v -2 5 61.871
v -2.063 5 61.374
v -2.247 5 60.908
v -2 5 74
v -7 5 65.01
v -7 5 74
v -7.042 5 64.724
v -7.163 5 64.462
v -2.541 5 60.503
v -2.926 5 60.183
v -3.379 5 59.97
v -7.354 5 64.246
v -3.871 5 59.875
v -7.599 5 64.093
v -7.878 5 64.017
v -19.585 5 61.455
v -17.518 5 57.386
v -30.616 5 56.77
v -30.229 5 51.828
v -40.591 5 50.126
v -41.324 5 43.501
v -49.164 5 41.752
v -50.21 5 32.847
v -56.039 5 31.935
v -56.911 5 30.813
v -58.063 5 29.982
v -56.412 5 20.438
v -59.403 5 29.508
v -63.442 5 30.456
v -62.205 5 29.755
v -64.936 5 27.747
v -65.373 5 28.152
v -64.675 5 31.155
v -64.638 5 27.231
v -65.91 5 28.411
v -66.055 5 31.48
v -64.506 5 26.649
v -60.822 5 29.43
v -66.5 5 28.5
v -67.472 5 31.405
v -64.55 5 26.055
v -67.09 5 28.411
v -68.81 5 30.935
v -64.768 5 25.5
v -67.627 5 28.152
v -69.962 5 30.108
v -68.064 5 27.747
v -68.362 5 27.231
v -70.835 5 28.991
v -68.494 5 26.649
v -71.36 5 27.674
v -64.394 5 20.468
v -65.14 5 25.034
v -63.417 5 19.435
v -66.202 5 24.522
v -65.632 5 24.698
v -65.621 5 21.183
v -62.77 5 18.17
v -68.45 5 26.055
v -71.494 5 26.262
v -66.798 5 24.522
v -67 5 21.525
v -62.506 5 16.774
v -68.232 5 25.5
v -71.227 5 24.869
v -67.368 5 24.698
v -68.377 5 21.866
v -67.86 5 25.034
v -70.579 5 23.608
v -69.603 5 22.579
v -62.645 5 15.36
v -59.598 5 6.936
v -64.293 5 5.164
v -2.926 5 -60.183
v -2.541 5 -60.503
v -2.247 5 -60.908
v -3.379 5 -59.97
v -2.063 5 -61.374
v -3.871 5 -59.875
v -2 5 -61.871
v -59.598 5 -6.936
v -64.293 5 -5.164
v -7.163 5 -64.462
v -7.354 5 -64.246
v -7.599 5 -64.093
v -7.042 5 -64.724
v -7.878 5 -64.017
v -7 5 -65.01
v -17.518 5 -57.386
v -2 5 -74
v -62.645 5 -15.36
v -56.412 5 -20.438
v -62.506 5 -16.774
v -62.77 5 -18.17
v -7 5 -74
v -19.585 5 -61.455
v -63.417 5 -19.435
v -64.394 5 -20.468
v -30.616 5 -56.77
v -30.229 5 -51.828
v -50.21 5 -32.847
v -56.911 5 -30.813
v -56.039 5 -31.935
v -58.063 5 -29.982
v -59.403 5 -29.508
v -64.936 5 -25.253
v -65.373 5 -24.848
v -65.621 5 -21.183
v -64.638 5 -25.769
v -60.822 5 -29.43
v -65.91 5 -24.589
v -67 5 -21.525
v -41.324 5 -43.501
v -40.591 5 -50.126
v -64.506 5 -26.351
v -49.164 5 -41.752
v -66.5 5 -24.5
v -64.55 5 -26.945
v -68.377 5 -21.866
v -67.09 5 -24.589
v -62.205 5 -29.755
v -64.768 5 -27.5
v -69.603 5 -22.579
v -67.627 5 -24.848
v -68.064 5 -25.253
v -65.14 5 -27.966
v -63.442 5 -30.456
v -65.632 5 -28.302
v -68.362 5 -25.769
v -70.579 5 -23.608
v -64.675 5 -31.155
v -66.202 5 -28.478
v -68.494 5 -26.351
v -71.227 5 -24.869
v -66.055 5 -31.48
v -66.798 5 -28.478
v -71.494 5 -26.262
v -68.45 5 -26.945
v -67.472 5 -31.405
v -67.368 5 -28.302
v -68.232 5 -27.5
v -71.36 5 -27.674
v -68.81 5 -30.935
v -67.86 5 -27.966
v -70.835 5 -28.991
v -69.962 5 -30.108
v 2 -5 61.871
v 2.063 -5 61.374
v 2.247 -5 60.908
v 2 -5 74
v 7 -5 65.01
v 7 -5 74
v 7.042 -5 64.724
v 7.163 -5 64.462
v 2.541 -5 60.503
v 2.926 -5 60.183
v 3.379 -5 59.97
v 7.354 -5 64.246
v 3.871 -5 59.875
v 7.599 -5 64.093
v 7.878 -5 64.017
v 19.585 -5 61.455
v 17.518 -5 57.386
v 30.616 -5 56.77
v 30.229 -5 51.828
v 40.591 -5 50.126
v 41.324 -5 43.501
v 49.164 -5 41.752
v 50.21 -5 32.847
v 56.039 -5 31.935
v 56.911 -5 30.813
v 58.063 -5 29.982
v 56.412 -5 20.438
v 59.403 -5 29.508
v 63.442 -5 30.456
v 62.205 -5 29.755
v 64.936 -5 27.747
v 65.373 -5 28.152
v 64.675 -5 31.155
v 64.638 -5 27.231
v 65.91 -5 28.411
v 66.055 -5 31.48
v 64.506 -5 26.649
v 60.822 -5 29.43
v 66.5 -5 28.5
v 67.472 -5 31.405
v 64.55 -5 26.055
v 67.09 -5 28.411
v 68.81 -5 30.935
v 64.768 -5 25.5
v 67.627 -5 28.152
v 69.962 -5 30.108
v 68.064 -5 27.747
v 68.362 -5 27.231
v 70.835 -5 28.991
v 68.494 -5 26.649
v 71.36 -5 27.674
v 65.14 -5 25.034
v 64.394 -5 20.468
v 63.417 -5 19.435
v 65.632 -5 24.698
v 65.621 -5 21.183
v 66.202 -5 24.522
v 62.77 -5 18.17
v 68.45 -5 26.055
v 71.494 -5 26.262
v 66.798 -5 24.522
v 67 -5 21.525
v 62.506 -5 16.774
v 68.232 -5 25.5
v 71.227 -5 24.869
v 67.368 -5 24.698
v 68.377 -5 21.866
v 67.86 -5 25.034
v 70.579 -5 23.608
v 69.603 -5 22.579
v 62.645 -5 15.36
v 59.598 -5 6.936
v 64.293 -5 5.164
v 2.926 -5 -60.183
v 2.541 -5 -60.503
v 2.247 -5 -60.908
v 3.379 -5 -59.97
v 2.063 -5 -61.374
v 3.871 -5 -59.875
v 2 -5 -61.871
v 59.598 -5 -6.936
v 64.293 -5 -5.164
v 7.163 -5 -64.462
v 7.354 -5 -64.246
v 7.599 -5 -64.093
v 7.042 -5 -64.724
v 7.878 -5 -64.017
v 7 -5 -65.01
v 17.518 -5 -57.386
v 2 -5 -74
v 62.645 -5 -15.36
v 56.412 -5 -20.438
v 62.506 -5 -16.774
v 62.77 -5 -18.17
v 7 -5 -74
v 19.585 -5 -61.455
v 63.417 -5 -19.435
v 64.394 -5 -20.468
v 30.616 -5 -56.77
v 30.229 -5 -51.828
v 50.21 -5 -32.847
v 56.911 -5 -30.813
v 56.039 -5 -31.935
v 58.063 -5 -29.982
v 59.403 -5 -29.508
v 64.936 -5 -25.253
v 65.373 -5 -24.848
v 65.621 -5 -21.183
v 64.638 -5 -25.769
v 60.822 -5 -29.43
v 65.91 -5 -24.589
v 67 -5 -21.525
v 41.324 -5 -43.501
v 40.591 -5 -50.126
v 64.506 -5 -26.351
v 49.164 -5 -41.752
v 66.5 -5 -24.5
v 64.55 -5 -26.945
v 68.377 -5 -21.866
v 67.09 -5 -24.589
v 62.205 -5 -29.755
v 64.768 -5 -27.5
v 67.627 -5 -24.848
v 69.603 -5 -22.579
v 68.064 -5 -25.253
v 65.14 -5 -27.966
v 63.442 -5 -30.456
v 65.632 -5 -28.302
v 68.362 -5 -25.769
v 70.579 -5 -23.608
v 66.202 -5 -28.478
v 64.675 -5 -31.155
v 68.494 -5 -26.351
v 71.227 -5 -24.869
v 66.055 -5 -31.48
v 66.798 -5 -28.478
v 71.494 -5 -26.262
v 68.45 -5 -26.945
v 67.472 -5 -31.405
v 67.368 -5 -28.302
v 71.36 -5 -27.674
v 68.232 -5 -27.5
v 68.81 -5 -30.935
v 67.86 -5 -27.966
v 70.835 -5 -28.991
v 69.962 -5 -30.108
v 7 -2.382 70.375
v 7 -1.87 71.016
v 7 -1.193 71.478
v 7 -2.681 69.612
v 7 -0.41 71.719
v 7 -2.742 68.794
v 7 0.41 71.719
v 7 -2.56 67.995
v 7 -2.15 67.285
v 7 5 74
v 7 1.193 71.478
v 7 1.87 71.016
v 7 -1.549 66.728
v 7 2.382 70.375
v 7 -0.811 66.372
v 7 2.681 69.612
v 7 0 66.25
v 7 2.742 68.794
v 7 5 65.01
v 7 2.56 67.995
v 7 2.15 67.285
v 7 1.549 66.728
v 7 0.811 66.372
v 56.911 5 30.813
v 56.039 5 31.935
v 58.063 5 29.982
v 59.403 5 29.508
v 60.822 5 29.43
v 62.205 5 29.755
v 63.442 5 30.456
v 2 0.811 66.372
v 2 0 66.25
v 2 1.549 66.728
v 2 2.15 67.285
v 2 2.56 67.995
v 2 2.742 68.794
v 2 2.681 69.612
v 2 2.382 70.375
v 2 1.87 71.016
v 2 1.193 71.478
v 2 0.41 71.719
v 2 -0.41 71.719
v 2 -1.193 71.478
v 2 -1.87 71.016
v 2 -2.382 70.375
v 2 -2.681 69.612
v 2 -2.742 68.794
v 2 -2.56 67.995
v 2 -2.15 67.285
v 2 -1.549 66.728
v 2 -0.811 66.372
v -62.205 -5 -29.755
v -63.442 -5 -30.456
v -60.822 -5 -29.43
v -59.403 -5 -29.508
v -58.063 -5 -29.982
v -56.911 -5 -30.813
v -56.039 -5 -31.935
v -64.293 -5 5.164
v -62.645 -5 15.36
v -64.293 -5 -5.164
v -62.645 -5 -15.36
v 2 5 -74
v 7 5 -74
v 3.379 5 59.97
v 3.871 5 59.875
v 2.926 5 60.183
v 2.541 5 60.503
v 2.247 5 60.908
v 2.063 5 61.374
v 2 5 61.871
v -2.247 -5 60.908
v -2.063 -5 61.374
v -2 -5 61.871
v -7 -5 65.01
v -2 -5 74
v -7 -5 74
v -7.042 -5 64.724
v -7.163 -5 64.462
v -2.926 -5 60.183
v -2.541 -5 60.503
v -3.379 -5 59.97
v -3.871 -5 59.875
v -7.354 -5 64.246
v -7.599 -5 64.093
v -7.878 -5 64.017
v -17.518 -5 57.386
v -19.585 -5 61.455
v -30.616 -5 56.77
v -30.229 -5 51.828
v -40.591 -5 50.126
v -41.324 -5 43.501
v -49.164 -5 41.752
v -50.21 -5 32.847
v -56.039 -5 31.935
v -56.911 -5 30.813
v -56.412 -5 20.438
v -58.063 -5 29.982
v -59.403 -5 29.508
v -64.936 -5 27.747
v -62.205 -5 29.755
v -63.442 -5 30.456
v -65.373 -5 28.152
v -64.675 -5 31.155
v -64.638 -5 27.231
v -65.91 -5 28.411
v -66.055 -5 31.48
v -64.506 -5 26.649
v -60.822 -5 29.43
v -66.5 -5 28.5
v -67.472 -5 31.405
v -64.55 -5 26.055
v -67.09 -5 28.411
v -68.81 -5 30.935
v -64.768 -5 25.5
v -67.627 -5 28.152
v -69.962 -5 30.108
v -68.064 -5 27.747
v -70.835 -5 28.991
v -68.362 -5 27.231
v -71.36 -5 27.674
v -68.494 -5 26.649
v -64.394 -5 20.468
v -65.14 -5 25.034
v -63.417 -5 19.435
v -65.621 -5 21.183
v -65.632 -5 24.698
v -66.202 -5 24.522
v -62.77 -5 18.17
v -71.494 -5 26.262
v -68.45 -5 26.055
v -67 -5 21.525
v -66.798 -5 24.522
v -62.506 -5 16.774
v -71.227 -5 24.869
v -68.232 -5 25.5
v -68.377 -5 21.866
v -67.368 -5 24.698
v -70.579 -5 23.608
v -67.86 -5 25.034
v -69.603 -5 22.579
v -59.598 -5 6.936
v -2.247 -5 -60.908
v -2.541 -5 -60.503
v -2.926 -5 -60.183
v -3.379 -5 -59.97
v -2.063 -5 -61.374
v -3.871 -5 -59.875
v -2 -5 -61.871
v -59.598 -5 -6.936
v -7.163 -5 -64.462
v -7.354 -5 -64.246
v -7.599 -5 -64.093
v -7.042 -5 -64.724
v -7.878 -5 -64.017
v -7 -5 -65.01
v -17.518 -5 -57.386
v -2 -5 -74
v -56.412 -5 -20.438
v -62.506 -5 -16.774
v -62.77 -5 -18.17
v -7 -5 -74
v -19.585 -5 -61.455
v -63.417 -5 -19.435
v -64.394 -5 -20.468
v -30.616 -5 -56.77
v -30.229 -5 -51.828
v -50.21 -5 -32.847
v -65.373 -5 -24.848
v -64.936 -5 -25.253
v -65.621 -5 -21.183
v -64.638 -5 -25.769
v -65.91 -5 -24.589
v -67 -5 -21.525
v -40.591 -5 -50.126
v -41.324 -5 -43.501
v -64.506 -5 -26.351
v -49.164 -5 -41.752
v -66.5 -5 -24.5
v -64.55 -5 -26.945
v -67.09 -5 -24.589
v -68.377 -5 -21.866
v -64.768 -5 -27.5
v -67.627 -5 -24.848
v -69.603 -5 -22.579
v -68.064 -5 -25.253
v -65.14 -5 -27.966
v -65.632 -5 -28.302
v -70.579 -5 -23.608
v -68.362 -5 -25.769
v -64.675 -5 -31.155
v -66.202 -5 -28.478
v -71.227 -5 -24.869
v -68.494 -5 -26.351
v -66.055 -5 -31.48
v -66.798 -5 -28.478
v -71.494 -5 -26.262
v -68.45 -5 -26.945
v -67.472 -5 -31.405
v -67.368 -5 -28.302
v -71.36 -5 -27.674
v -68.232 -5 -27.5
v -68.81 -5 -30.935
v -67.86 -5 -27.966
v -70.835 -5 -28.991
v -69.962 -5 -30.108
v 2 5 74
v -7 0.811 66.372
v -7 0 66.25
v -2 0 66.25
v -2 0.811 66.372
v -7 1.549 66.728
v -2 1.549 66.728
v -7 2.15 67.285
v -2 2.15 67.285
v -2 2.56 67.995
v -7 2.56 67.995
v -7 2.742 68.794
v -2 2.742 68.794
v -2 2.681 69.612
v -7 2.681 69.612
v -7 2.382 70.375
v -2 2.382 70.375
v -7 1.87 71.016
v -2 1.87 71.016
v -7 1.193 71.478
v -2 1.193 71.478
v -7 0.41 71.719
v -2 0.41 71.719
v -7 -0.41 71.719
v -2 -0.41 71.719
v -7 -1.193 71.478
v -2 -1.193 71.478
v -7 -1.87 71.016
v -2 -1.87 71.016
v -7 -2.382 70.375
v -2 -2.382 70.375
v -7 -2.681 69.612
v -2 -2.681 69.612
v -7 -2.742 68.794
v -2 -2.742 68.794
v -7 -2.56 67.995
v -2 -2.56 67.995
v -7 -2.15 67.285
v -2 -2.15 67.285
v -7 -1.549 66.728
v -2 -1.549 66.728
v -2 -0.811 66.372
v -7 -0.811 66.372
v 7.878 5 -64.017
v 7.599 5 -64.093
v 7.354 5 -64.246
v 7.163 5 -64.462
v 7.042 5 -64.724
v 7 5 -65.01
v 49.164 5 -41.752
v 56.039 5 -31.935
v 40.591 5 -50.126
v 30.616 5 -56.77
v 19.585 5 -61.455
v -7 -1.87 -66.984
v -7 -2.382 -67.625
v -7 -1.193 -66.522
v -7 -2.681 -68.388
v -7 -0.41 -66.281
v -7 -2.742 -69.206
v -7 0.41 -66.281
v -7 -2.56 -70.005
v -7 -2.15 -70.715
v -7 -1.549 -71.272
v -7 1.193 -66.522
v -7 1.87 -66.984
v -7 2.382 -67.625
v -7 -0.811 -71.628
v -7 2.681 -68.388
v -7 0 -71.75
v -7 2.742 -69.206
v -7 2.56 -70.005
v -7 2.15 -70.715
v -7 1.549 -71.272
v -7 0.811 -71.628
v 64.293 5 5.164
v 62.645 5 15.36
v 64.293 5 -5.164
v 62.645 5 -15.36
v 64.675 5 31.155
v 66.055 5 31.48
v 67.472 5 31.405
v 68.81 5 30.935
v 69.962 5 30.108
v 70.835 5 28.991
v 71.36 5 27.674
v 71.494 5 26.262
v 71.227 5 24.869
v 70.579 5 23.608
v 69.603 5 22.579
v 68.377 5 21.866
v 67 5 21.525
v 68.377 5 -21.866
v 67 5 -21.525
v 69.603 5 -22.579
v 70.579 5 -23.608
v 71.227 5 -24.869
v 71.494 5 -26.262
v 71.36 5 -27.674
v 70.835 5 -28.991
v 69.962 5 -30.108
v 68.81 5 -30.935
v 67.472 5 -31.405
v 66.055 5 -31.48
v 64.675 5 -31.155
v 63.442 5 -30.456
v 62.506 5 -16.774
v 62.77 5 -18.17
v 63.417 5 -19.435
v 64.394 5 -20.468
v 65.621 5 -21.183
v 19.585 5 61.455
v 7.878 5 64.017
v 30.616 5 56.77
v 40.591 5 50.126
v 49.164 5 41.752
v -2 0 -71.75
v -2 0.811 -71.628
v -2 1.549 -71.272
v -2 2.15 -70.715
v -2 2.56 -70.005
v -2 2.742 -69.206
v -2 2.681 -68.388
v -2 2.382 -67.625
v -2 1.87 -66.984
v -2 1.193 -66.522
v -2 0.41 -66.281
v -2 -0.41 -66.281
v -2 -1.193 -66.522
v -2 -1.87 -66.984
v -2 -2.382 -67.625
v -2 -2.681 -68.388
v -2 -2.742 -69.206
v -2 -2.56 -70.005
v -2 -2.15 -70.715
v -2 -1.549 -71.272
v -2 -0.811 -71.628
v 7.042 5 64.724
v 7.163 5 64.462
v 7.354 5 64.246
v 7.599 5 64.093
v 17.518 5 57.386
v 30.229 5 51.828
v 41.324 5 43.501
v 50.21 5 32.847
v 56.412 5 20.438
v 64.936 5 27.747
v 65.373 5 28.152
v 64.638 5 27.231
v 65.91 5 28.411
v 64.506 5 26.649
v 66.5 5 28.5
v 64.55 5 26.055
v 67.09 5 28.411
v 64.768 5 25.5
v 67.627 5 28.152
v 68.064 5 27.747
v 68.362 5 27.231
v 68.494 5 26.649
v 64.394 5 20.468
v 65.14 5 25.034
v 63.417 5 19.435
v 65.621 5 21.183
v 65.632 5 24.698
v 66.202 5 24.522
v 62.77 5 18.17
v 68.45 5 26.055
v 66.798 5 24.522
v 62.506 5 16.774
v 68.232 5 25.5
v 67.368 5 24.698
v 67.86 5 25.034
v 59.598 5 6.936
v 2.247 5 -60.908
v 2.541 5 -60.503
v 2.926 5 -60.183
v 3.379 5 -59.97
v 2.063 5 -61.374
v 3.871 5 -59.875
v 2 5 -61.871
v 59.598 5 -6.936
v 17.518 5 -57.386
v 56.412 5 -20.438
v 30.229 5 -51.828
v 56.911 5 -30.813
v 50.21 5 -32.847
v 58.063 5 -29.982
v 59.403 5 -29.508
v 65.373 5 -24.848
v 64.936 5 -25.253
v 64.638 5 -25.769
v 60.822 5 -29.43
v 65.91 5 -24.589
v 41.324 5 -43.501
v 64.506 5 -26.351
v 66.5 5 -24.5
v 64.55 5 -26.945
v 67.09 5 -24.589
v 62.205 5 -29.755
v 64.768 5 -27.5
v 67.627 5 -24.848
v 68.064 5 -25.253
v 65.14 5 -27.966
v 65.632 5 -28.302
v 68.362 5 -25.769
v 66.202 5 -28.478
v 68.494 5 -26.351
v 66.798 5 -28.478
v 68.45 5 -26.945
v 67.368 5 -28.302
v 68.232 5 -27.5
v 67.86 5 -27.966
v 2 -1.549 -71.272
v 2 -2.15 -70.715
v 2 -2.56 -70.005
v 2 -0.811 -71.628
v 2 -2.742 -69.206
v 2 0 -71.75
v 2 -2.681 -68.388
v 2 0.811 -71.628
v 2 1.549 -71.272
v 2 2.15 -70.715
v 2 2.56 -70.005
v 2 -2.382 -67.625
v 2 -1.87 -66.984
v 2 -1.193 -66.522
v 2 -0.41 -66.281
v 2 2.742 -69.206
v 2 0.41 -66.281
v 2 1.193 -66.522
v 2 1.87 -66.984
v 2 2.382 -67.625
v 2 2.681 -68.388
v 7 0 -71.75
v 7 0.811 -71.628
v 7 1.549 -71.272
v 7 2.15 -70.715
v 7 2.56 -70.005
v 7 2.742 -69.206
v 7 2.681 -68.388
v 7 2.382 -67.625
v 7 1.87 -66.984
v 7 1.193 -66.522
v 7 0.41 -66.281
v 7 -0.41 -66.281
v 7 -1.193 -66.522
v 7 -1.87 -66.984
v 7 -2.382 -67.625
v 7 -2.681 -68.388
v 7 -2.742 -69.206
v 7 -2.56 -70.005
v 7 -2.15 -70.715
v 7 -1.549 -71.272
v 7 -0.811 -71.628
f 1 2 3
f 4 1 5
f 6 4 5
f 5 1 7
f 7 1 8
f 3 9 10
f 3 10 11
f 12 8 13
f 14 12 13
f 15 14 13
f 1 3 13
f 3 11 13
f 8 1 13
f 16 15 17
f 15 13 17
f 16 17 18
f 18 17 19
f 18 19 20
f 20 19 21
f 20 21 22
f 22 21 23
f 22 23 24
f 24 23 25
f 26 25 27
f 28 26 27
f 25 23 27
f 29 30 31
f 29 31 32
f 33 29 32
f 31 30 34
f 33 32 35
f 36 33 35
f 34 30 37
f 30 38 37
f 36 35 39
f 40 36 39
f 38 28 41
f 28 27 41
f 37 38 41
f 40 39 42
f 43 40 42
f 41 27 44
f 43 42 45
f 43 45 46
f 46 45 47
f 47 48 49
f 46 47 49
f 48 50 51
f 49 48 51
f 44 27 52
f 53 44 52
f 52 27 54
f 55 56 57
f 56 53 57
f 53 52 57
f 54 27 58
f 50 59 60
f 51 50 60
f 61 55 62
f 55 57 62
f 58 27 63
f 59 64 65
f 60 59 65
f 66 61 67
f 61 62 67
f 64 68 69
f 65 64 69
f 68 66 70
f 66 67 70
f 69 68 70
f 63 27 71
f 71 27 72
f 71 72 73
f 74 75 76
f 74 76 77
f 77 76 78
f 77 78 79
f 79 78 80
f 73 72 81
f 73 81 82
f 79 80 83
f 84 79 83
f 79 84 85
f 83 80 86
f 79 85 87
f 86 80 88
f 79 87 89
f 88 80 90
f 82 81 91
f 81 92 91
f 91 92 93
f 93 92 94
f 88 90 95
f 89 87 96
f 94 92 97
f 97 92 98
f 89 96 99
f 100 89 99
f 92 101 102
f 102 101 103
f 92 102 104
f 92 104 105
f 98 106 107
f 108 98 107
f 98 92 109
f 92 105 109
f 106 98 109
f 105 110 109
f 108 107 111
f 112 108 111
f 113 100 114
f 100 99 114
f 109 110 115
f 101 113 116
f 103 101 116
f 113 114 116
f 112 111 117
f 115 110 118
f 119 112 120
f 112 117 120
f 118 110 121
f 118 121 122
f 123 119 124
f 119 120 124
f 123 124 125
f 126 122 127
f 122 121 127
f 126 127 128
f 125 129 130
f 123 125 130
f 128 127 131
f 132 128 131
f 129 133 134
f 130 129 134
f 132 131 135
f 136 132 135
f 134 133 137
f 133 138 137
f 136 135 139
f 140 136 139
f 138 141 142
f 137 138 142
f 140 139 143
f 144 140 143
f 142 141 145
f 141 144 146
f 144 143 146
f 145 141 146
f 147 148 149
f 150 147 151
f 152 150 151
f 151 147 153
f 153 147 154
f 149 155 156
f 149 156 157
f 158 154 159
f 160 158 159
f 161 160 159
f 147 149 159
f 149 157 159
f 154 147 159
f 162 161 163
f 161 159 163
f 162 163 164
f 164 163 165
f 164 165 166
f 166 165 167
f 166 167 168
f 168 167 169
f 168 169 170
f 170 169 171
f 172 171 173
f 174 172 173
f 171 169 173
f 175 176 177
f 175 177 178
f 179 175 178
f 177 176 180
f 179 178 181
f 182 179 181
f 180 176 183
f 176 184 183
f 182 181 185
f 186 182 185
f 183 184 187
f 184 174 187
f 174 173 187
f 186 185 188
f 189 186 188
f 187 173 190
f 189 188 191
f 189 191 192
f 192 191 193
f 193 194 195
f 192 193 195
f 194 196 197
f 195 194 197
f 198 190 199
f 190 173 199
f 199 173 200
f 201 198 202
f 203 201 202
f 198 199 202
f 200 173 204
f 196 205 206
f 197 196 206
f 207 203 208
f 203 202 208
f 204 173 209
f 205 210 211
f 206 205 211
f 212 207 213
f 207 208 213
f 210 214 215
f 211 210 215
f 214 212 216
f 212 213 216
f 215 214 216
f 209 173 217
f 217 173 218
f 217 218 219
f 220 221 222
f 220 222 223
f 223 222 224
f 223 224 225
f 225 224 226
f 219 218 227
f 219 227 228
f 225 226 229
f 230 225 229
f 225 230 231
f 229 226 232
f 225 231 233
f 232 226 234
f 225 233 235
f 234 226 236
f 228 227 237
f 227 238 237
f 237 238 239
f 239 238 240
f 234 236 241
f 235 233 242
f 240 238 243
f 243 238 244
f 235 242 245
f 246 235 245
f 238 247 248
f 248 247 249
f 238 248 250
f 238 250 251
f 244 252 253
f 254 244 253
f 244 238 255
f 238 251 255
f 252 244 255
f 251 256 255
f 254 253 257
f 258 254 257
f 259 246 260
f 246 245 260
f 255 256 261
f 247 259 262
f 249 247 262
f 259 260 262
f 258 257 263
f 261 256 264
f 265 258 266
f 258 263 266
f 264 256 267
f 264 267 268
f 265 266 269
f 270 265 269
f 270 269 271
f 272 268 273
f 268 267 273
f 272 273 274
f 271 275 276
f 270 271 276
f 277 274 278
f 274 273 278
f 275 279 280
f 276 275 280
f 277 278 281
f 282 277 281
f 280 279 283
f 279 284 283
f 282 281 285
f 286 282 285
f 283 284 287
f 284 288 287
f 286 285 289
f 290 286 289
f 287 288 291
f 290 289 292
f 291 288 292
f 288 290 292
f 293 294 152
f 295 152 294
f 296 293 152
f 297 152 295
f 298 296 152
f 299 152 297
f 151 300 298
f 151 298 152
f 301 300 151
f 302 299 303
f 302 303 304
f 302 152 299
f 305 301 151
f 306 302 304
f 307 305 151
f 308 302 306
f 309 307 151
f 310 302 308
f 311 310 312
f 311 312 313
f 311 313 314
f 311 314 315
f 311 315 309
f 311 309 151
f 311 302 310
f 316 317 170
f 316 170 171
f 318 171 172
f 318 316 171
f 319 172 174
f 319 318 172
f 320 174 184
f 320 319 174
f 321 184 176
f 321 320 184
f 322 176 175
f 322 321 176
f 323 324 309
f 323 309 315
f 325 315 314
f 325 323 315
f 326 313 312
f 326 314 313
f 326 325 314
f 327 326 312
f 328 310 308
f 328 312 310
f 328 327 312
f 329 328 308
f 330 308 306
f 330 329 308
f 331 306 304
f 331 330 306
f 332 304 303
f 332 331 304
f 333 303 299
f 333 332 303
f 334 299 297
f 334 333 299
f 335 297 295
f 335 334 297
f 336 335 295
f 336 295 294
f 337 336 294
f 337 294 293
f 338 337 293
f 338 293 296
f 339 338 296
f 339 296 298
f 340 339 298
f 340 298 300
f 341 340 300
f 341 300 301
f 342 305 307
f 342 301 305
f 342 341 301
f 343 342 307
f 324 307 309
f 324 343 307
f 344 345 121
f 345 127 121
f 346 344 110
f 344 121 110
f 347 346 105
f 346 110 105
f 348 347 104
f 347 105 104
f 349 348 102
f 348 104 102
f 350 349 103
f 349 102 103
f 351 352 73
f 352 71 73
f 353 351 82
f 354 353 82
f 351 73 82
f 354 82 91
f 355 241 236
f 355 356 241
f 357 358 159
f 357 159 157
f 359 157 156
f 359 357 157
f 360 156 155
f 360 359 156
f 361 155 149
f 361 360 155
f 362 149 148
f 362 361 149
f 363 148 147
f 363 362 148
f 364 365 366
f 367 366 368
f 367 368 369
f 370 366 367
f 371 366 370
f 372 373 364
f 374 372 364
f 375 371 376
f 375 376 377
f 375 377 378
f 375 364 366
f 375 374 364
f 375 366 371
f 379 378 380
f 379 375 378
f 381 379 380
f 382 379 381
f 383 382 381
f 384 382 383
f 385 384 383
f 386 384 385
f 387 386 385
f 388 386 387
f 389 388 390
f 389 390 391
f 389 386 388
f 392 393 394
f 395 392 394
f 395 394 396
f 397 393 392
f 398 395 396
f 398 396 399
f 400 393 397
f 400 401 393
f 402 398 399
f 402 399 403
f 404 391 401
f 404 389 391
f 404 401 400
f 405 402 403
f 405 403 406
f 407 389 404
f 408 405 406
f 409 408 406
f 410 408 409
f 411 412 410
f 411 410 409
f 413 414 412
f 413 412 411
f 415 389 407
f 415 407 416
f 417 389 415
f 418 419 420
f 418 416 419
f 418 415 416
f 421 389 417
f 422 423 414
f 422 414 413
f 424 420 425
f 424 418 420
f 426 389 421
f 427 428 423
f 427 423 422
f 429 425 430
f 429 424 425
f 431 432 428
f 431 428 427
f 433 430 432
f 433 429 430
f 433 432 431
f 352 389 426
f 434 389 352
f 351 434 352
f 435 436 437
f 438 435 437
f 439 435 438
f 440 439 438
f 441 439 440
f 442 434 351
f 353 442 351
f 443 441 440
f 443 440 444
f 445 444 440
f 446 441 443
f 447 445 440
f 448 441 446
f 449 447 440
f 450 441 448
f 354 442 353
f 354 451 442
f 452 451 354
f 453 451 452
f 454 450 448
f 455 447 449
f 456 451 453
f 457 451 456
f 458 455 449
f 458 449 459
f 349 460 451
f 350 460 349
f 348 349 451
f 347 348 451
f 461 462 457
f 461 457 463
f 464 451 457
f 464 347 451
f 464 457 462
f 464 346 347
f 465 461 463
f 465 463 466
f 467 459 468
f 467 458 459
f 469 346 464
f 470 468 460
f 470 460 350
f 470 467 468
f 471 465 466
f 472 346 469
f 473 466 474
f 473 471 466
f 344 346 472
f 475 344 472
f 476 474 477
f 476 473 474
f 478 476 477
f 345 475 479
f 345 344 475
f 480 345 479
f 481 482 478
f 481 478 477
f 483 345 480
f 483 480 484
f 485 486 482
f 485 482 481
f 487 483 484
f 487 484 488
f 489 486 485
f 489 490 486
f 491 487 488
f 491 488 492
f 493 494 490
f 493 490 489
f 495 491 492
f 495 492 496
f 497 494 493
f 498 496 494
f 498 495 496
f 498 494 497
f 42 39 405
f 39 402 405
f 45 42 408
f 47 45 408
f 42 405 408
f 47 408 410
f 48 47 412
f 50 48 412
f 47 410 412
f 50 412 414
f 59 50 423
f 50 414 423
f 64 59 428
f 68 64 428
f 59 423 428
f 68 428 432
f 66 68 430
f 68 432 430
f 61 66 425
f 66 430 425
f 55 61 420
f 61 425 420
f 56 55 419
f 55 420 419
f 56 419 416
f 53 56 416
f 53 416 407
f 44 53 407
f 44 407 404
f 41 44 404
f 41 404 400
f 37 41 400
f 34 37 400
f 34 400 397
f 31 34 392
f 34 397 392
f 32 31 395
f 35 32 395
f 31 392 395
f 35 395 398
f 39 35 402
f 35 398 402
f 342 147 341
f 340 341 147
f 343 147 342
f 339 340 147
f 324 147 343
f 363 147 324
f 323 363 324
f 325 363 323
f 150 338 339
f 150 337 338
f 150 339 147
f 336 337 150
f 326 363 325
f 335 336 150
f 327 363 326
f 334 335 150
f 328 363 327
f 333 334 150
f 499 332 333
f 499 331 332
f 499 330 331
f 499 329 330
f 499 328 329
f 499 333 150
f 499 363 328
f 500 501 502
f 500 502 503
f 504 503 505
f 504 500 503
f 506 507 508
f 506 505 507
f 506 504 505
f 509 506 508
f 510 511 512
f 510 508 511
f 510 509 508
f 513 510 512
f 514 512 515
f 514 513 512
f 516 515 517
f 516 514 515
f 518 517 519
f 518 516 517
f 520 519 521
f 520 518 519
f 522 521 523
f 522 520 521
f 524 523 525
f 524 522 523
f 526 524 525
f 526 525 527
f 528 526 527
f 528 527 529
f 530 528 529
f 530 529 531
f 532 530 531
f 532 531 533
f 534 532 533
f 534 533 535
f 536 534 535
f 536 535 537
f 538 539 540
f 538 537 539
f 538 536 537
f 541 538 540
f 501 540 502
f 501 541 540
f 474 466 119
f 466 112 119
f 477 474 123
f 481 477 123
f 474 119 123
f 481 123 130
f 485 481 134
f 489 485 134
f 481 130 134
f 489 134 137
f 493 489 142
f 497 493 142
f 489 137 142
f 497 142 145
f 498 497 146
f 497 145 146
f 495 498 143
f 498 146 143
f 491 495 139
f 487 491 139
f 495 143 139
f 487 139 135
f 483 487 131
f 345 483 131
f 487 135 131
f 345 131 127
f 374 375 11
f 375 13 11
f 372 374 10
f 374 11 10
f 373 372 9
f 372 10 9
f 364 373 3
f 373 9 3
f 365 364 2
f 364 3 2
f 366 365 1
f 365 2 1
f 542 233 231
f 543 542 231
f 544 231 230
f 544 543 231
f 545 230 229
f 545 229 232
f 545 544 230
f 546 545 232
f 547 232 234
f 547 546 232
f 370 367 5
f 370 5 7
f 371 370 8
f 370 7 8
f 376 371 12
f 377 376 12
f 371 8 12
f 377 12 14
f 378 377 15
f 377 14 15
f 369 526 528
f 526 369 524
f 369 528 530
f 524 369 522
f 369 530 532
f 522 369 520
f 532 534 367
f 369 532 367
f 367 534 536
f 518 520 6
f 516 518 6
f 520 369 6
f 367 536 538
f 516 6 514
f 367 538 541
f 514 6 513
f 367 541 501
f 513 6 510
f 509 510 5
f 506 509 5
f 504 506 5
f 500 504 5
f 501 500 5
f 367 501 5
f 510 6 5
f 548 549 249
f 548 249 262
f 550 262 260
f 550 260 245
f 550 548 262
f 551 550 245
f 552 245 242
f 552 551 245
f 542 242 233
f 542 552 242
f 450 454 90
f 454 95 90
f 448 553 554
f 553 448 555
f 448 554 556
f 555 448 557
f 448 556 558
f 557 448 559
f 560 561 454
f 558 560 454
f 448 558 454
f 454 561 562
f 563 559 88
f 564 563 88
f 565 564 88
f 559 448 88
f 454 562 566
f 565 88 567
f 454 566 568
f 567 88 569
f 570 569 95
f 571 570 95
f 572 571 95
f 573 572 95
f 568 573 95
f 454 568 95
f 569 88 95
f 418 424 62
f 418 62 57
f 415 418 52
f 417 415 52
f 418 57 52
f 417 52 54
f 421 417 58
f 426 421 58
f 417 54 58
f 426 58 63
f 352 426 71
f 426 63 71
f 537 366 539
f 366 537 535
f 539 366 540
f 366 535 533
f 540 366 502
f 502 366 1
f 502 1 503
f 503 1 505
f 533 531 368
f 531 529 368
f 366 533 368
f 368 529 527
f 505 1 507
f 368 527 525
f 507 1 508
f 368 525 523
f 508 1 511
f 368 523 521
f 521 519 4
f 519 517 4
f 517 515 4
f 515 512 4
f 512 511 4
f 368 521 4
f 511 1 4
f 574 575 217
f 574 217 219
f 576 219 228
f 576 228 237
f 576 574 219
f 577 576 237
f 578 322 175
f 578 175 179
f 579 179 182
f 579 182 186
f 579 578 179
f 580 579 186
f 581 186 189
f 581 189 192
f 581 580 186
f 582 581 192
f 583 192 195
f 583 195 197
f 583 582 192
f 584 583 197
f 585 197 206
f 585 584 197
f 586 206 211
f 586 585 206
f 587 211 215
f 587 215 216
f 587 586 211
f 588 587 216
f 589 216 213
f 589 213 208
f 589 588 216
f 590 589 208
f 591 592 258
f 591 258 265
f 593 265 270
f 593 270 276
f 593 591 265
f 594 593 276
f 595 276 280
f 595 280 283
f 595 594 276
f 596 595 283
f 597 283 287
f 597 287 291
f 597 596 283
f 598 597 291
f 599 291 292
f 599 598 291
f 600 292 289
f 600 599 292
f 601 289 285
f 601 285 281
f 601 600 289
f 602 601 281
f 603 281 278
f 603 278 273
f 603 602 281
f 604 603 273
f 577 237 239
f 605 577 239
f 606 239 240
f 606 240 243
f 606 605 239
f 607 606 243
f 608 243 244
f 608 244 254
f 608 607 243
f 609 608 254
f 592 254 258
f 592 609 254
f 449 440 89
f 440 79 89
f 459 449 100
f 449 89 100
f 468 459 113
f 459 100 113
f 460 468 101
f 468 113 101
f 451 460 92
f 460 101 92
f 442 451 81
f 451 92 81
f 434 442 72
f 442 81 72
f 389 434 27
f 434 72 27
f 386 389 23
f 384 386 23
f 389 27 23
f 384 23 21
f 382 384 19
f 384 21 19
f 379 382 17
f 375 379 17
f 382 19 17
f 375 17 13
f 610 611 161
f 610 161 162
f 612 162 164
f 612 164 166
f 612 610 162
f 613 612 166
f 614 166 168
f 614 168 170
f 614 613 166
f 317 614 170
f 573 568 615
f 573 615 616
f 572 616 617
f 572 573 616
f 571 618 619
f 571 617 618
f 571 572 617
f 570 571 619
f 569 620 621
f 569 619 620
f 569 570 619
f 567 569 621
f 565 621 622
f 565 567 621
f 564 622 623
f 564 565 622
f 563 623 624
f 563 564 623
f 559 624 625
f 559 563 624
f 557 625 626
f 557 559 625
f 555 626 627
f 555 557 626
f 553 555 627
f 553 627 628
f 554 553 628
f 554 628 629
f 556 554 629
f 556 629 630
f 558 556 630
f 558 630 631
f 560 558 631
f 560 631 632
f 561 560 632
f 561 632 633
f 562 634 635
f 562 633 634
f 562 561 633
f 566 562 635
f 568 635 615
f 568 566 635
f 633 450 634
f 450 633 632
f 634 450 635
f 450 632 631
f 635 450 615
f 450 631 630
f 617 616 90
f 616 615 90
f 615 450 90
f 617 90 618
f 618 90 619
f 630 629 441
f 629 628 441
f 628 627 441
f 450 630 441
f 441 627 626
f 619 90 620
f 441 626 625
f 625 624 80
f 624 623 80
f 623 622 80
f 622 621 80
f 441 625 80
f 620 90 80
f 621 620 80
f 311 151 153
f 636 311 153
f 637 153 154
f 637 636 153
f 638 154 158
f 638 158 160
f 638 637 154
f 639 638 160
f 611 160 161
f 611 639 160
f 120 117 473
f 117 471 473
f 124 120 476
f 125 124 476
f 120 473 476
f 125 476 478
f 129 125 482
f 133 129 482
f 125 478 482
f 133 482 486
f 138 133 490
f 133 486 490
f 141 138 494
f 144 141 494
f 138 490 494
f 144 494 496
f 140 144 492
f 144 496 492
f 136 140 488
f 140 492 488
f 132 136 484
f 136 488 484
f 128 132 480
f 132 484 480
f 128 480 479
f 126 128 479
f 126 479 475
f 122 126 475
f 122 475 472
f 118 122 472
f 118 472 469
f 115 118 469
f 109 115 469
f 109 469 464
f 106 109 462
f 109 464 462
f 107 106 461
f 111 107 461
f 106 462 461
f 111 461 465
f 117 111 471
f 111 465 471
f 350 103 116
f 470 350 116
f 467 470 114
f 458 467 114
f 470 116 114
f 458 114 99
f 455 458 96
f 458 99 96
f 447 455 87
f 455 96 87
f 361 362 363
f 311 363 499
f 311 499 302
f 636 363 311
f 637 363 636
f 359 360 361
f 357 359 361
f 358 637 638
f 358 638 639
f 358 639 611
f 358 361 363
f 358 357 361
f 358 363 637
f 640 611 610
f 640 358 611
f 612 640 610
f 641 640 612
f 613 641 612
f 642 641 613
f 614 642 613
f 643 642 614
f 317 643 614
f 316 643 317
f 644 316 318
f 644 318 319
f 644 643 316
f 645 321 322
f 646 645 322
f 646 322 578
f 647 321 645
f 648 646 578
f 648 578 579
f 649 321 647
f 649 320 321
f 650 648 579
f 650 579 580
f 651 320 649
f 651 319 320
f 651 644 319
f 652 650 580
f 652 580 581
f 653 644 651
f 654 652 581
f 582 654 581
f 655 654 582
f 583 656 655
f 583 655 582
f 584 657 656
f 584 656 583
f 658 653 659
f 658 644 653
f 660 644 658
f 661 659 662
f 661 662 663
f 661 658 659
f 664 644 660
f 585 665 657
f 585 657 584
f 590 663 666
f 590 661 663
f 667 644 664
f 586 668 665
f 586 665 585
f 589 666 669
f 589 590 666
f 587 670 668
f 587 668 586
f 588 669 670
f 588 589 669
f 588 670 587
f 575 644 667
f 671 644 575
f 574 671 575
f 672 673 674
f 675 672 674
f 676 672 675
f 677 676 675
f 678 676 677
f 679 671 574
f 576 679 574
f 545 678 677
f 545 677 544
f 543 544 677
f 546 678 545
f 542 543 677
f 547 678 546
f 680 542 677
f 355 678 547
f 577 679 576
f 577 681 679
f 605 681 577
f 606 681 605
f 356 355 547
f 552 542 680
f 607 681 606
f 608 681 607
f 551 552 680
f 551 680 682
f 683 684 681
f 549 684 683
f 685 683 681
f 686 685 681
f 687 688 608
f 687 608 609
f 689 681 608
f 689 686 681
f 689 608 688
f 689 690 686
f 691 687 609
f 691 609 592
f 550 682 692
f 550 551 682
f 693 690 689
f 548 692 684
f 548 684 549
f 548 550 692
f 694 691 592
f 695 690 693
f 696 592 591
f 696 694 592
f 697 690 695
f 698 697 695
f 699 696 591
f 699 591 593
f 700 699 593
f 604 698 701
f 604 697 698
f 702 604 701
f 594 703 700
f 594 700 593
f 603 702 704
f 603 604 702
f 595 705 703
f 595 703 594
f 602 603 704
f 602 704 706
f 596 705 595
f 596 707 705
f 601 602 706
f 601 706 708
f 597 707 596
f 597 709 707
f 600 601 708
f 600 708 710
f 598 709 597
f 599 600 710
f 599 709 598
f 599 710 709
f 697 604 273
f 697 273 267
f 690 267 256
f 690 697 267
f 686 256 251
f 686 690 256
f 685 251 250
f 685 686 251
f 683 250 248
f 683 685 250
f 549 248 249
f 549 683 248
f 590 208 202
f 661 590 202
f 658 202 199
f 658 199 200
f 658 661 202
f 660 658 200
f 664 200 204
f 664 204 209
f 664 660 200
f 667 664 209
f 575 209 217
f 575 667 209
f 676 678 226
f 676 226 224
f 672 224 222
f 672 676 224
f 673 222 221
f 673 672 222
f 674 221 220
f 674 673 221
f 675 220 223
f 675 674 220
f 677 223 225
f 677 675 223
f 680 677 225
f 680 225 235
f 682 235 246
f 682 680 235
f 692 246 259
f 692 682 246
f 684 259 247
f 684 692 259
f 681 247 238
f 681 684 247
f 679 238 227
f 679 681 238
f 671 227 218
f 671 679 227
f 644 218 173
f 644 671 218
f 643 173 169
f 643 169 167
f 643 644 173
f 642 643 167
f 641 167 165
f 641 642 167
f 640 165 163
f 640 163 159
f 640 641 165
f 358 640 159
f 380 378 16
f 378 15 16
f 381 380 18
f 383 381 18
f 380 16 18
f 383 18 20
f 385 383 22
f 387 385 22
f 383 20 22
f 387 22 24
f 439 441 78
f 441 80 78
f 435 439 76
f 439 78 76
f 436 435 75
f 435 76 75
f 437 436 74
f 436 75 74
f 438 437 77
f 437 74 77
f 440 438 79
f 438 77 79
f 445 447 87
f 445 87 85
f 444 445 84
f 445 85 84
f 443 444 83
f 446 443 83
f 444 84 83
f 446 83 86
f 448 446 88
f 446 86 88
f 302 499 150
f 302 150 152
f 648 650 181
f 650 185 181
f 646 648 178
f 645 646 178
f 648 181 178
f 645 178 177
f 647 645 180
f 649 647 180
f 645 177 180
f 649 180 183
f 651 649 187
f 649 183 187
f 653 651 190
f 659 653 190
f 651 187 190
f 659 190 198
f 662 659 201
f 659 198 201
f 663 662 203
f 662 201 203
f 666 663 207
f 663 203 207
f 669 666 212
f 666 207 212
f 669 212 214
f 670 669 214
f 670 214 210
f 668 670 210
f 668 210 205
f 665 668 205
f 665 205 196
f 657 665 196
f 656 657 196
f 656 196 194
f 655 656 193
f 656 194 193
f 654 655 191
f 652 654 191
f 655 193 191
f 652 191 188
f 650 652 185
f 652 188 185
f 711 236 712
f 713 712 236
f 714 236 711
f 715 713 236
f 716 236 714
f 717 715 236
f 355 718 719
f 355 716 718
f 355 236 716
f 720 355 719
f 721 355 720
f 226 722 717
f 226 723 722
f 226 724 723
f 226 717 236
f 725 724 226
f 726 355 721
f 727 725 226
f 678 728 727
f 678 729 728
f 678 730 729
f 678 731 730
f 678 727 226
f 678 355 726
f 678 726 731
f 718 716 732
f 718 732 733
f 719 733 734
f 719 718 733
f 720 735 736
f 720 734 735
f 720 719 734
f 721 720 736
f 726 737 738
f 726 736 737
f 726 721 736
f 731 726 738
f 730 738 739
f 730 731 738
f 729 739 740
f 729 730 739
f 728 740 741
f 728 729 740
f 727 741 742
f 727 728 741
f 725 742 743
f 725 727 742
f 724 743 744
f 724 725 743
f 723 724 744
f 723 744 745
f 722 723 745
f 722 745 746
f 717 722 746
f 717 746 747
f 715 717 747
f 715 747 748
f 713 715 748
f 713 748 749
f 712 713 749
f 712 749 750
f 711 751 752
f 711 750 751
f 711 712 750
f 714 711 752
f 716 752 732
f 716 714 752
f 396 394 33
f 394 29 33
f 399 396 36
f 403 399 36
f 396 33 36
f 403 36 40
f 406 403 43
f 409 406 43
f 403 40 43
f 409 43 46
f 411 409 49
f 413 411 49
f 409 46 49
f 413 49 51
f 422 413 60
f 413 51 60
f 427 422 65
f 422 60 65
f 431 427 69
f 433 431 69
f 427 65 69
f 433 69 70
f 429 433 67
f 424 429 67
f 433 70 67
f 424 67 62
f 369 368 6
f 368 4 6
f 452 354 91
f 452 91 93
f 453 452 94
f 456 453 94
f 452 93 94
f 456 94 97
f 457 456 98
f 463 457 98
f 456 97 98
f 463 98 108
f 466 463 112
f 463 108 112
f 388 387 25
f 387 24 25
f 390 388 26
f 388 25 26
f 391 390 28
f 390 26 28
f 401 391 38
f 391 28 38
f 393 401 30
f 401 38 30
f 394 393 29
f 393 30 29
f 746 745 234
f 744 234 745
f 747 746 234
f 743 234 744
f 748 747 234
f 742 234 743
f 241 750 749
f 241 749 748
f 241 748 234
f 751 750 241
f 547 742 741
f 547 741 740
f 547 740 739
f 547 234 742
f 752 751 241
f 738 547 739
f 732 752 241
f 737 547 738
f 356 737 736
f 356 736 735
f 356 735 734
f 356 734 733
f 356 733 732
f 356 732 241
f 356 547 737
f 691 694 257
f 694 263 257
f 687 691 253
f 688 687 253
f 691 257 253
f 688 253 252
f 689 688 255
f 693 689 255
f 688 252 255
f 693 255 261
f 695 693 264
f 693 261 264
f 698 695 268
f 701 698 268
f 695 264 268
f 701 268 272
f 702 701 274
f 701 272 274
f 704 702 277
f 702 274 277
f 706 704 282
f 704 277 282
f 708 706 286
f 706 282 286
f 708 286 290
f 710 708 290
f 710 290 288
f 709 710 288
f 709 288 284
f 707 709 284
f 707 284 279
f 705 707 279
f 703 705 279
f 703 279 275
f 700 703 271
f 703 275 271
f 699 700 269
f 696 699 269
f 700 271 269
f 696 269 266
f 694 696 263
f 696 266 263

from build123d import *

# Parameters (mm, degrees)
EXTRUDE_1_DEPTH                = 5
EXTRUDE_1_2_DEPTH              = 5
CUT_EXTRUDE_1_DEPTH            = 104.020629002
CUT_EXTRUDE_1_DEPTH_BACK       = 104.020629002
SKETCH_2_R                     = 2.75
SKETCH_4_W                     = 2
SKETCH_4_H                     = 10
HOLE_WIZARD_4_0_4_1_AT_2_COUNT = 2
HOLE_WIZARD_4_0_4_1_AT_2_PITCH = 53
HOLE_WIZARD_4_0_4_1_AT_3_COUNT = 2
HOLE_WIZARD_4_0_4_1_AT_3_PITCH = 143.171226159
HOLE_WIZARD_4_0_4_1_AT_4_COUNT = 2
HOLE_WIZARD_4_0_4_1_AT_4_PITCH = 133


with BuildPart() as part:
    # 草图1 → 凸台-拉伸1 (new, symmetric)
    with BuildSketch(Plane(origin=(0, 0, 0), x_dir=(1, 0, 0), z_dir=(0, 1, 0))):
        with BuildLine():
            Line((-7, 65.009614674), (-7, 74))
            Line((-7, 74), (-2, 74))
            Line((-2, 74), (-2, 61.870833193))
            ThreePointArc((-2, 61.870833193), (-2.540879629, 60.502999964), (-3.870967742, 59.874999864))
            ThreePointArc((-3.870967742, 59.874999864), (-60, 0), (-3.870967742, -59.874999864))
            ThreePointArc((-3.870967742, -59.874999864), (-2.540879629, -60.502999964), (-2, -61.870833193))
            Line((-2, -61.870833193), (-2, -74))
            Line((-2, -74), (-7, -74))
            Line((-7, -74), (-7, -65.009614674))
            ThreePointArc((-7, -65.009614674), (-7.250954806, -64.34709577), (-7.877862595, -64.017101472))
            ThreePointArc((-7.877862595, -64.017101472), (-35.758246425, -53.680516136), (-56.039077408, -31.935431784))
            ThreePointArc((-56.039077408, -31.935431784), (-59.402990359, -29.508067468), (-63.441595968, -30.455523325))
            ThreePointArc((-63.441595968, -30.455523325), (-71.144788047, -28.350930575), (-67.000337391, -21.525096735))
            ThreePointArc((-67.000337391, -21.525096735), (-63.416978813, -19.435228518), (-62.644511129, -15.35953207))
            ThreePointArc((-62.644511129, -15.35953207), (-64.5, 0), (-62.644511129, 15.35953207))
            ThreePointArc((-62.644511129, 15.35953207), (-63.416978813, 19.435228518), (-67.000337391, 21.525096735))
            ThreePointArc((-67.000337391, 21.525096735), (-71.144788047, 28.350930575), (-63.441595968, 30.455523325))
            ThreePointArc((-63.441595968, 30.455523325), (-59.402990359, 29.508067468), (-56.039077408, 31.935431784))
            ThreePointArc((-56.039077408, 31.935431784), (-35.758246425, 53.680516136), (-7.877862595, 64.017101472))
            ThreePointArc((-7.877862595, 64.017101472), (-7.250954806, 64.34709577), (-7, 65.009614674))
        make_face()
    extrude(amount=EXTRUDE_1_DEPTH, both=True)


with BuildPart() as body_2:
    # 草图1 → Extrude 1 2 (new, symmetric)
    with BuildSketch(Plane(origin=(0, 0, 0), x_dir=(1, 0, 0), z_dir=(0, 1, 0))):
        with BuildLine():
            Line((2, 74), (2, 61.870833193))
            ThreePointArc((2, 61.870833193), (2.540879629, 60.502999964), (3.870967742, 59.874999864))
            ThreePointArc((3.870967742, 59.874999864), (60, 0), (3.870967742, -59.874999864))
            ThreePointArc((3.870967742, -59.874999864), (2.540879629, -60.502999964), (2, -61.870833193))
            Line((2, -61.870833193), (2, -74))
            Line((2, -74), (7, -74))
            Line((7, -74), (7, -65.009614674))
            ThreePointArc((7, -65.009614674), (7.250954806, -64.34709577), (7.877862595, -64.017101472))
            ThreePointArc((7.877862595, -64.017101472), (35.758246425, -53.680516136), (56.039077408, -31.935431784))
            ThreePointArc((56.039077408, -31.935431784), (59.402990359, -29.508067468), (63.441595968, -30.455523325))
            ThreePointArc((63.441595968, -30.455523325), (71.144788047, -28.350930575), (67.000337391, -21.525096735))
            ThreePointArc((67.000337391, -21.525096735), (63.416978813, -19.435228518), (62.644511129, -15.35953207))
            ThreePointArc((62.644511129, -15.35953207), (64.5, 0), (62.644511129, 15.35953207))
            ThreePointArc((62.644511129, 15.35953207), (63.416978813, 19.435228518), (67.000337391, 21.525096735))
            ThreePointArc((67.000337391, 21.525096735), (71.144788047, 28.350930575), (63.441595968, 30.455523325))
            ThreePointArc((63.441595968, 30.455523325), (59.402990359, 29.508067468), (56.039077408, 31.935431784))
            ThreePointArc((56.039077408, 31.935431784), (35.758246425, 53.680516136), (7.877862595, 64.017101472))
            ThreePointArc((7.877862595, 64.017101472), (7.250954806, 64.34709577), (7, 65.009614674))
            Line((7, 65.009614674), (7, 74))
            Line((7, 74), (2, 74))
        make_face()
    extrude(amount=EXTRUDE_1_2_DEPTH, both=True)


with BuildPart() as cut_extrude_1_tool:
    # 草图2 → 切除-拉伸1 (new, two sides: drawn at the far end of the back side and taken through both)
    with BuildSketch(Plane(origin=(0, 0, 0), x_dir=(0, 0, -1), z_dir=(1, 0, 0)).offset(-CUT_EXTRUDE_1_DEPTH_BACK)):
        with Locations((-69, 0)):
            Circle(SKETCH_2_R)
        with Locations((69, 0)):
            Circle(SKETCH_2_R)
    extrude(amount=CUT_EXTRUDE_1_DEPTH + CUT_EXTRUDE_1_DEPTH_BACK)


with BuildPart() as part_1:
    add(part.part)

    # 切除-拉伸1: cut by cut_extrude_1_tool
    add(cut_extrude_1_tool.part, mode=Mode.SUBTRACT)

    # 草图4 → Ø4.0 (4) 直径孔1 (revolve, cut)
    with BuildSketch(Plane(origin=(-66.5, 5, -26.5), x_dir=(0, 0, 1), z_dir=(1, 0, 0))):
        with Locations((1, 5)):
            Rectangle(SKETCH_4_W, SKETCH_4_H)
    hole_wizard_4_0_4_1 = revolve(axis=Axis((-66.5, 11.35, -26.5), (0, -1, 0)), mode=Mode.SUBTRACT)

    # Ø4.0 (4) 直径孔1 at 2: Ø4.0 (4) 直径孔1 ×2
    with Locations(*[(0, 0, i * HOLE_WIZARD_4_0_4_1_AT_2_PITCH) for i in range(1, HOLE_WIZARD_4_0_4_1_AT_2_COUNT)]):
        add(hole_wizard_4_0_4_1, mode=Mode.SUBTRACT)


with BuildPart() as body_2_1:
    add(body_2.part)

    # 切除-拉伸1: cut by cut_extrude_1_tool
    add(cut_extrude_1_tool.part, mode=Mode.SUBTRACT)

    # Ø4.0 (4) 直径孔1 at 3: Ø4.0 (4) 直径孔1 ×2
    with Locations(*[Vector(0.9289576094841776, 0, 0.37018611505760474) * (i * HOLE_WIZARD_4_0_4_1_AT_3_PITCH) for i in range(1, HOLE_WIZARD_4_0_4_1_AT_3_COUNT)]):
        add(hole_wizard_4_0_4_1, mode=Mode.SUBTRACT)

    # Ø4.0 (4) 直径孔1 at 4: Ø4.0 (4) 直径孔1 ×2
    with Locations(*[(i * HOLE_WIZARD_4_0_4_1_AT_4_PITCH, 0, 0) for i in range(1, HOLE_WIZARD_4_0_4_1_AT_4_COUNT)]):
        add(hole_wizard_4_0_4_1, mode=Mode.SUBTRACT)


solid = Compound([part_1.part, body_2_1.part])
